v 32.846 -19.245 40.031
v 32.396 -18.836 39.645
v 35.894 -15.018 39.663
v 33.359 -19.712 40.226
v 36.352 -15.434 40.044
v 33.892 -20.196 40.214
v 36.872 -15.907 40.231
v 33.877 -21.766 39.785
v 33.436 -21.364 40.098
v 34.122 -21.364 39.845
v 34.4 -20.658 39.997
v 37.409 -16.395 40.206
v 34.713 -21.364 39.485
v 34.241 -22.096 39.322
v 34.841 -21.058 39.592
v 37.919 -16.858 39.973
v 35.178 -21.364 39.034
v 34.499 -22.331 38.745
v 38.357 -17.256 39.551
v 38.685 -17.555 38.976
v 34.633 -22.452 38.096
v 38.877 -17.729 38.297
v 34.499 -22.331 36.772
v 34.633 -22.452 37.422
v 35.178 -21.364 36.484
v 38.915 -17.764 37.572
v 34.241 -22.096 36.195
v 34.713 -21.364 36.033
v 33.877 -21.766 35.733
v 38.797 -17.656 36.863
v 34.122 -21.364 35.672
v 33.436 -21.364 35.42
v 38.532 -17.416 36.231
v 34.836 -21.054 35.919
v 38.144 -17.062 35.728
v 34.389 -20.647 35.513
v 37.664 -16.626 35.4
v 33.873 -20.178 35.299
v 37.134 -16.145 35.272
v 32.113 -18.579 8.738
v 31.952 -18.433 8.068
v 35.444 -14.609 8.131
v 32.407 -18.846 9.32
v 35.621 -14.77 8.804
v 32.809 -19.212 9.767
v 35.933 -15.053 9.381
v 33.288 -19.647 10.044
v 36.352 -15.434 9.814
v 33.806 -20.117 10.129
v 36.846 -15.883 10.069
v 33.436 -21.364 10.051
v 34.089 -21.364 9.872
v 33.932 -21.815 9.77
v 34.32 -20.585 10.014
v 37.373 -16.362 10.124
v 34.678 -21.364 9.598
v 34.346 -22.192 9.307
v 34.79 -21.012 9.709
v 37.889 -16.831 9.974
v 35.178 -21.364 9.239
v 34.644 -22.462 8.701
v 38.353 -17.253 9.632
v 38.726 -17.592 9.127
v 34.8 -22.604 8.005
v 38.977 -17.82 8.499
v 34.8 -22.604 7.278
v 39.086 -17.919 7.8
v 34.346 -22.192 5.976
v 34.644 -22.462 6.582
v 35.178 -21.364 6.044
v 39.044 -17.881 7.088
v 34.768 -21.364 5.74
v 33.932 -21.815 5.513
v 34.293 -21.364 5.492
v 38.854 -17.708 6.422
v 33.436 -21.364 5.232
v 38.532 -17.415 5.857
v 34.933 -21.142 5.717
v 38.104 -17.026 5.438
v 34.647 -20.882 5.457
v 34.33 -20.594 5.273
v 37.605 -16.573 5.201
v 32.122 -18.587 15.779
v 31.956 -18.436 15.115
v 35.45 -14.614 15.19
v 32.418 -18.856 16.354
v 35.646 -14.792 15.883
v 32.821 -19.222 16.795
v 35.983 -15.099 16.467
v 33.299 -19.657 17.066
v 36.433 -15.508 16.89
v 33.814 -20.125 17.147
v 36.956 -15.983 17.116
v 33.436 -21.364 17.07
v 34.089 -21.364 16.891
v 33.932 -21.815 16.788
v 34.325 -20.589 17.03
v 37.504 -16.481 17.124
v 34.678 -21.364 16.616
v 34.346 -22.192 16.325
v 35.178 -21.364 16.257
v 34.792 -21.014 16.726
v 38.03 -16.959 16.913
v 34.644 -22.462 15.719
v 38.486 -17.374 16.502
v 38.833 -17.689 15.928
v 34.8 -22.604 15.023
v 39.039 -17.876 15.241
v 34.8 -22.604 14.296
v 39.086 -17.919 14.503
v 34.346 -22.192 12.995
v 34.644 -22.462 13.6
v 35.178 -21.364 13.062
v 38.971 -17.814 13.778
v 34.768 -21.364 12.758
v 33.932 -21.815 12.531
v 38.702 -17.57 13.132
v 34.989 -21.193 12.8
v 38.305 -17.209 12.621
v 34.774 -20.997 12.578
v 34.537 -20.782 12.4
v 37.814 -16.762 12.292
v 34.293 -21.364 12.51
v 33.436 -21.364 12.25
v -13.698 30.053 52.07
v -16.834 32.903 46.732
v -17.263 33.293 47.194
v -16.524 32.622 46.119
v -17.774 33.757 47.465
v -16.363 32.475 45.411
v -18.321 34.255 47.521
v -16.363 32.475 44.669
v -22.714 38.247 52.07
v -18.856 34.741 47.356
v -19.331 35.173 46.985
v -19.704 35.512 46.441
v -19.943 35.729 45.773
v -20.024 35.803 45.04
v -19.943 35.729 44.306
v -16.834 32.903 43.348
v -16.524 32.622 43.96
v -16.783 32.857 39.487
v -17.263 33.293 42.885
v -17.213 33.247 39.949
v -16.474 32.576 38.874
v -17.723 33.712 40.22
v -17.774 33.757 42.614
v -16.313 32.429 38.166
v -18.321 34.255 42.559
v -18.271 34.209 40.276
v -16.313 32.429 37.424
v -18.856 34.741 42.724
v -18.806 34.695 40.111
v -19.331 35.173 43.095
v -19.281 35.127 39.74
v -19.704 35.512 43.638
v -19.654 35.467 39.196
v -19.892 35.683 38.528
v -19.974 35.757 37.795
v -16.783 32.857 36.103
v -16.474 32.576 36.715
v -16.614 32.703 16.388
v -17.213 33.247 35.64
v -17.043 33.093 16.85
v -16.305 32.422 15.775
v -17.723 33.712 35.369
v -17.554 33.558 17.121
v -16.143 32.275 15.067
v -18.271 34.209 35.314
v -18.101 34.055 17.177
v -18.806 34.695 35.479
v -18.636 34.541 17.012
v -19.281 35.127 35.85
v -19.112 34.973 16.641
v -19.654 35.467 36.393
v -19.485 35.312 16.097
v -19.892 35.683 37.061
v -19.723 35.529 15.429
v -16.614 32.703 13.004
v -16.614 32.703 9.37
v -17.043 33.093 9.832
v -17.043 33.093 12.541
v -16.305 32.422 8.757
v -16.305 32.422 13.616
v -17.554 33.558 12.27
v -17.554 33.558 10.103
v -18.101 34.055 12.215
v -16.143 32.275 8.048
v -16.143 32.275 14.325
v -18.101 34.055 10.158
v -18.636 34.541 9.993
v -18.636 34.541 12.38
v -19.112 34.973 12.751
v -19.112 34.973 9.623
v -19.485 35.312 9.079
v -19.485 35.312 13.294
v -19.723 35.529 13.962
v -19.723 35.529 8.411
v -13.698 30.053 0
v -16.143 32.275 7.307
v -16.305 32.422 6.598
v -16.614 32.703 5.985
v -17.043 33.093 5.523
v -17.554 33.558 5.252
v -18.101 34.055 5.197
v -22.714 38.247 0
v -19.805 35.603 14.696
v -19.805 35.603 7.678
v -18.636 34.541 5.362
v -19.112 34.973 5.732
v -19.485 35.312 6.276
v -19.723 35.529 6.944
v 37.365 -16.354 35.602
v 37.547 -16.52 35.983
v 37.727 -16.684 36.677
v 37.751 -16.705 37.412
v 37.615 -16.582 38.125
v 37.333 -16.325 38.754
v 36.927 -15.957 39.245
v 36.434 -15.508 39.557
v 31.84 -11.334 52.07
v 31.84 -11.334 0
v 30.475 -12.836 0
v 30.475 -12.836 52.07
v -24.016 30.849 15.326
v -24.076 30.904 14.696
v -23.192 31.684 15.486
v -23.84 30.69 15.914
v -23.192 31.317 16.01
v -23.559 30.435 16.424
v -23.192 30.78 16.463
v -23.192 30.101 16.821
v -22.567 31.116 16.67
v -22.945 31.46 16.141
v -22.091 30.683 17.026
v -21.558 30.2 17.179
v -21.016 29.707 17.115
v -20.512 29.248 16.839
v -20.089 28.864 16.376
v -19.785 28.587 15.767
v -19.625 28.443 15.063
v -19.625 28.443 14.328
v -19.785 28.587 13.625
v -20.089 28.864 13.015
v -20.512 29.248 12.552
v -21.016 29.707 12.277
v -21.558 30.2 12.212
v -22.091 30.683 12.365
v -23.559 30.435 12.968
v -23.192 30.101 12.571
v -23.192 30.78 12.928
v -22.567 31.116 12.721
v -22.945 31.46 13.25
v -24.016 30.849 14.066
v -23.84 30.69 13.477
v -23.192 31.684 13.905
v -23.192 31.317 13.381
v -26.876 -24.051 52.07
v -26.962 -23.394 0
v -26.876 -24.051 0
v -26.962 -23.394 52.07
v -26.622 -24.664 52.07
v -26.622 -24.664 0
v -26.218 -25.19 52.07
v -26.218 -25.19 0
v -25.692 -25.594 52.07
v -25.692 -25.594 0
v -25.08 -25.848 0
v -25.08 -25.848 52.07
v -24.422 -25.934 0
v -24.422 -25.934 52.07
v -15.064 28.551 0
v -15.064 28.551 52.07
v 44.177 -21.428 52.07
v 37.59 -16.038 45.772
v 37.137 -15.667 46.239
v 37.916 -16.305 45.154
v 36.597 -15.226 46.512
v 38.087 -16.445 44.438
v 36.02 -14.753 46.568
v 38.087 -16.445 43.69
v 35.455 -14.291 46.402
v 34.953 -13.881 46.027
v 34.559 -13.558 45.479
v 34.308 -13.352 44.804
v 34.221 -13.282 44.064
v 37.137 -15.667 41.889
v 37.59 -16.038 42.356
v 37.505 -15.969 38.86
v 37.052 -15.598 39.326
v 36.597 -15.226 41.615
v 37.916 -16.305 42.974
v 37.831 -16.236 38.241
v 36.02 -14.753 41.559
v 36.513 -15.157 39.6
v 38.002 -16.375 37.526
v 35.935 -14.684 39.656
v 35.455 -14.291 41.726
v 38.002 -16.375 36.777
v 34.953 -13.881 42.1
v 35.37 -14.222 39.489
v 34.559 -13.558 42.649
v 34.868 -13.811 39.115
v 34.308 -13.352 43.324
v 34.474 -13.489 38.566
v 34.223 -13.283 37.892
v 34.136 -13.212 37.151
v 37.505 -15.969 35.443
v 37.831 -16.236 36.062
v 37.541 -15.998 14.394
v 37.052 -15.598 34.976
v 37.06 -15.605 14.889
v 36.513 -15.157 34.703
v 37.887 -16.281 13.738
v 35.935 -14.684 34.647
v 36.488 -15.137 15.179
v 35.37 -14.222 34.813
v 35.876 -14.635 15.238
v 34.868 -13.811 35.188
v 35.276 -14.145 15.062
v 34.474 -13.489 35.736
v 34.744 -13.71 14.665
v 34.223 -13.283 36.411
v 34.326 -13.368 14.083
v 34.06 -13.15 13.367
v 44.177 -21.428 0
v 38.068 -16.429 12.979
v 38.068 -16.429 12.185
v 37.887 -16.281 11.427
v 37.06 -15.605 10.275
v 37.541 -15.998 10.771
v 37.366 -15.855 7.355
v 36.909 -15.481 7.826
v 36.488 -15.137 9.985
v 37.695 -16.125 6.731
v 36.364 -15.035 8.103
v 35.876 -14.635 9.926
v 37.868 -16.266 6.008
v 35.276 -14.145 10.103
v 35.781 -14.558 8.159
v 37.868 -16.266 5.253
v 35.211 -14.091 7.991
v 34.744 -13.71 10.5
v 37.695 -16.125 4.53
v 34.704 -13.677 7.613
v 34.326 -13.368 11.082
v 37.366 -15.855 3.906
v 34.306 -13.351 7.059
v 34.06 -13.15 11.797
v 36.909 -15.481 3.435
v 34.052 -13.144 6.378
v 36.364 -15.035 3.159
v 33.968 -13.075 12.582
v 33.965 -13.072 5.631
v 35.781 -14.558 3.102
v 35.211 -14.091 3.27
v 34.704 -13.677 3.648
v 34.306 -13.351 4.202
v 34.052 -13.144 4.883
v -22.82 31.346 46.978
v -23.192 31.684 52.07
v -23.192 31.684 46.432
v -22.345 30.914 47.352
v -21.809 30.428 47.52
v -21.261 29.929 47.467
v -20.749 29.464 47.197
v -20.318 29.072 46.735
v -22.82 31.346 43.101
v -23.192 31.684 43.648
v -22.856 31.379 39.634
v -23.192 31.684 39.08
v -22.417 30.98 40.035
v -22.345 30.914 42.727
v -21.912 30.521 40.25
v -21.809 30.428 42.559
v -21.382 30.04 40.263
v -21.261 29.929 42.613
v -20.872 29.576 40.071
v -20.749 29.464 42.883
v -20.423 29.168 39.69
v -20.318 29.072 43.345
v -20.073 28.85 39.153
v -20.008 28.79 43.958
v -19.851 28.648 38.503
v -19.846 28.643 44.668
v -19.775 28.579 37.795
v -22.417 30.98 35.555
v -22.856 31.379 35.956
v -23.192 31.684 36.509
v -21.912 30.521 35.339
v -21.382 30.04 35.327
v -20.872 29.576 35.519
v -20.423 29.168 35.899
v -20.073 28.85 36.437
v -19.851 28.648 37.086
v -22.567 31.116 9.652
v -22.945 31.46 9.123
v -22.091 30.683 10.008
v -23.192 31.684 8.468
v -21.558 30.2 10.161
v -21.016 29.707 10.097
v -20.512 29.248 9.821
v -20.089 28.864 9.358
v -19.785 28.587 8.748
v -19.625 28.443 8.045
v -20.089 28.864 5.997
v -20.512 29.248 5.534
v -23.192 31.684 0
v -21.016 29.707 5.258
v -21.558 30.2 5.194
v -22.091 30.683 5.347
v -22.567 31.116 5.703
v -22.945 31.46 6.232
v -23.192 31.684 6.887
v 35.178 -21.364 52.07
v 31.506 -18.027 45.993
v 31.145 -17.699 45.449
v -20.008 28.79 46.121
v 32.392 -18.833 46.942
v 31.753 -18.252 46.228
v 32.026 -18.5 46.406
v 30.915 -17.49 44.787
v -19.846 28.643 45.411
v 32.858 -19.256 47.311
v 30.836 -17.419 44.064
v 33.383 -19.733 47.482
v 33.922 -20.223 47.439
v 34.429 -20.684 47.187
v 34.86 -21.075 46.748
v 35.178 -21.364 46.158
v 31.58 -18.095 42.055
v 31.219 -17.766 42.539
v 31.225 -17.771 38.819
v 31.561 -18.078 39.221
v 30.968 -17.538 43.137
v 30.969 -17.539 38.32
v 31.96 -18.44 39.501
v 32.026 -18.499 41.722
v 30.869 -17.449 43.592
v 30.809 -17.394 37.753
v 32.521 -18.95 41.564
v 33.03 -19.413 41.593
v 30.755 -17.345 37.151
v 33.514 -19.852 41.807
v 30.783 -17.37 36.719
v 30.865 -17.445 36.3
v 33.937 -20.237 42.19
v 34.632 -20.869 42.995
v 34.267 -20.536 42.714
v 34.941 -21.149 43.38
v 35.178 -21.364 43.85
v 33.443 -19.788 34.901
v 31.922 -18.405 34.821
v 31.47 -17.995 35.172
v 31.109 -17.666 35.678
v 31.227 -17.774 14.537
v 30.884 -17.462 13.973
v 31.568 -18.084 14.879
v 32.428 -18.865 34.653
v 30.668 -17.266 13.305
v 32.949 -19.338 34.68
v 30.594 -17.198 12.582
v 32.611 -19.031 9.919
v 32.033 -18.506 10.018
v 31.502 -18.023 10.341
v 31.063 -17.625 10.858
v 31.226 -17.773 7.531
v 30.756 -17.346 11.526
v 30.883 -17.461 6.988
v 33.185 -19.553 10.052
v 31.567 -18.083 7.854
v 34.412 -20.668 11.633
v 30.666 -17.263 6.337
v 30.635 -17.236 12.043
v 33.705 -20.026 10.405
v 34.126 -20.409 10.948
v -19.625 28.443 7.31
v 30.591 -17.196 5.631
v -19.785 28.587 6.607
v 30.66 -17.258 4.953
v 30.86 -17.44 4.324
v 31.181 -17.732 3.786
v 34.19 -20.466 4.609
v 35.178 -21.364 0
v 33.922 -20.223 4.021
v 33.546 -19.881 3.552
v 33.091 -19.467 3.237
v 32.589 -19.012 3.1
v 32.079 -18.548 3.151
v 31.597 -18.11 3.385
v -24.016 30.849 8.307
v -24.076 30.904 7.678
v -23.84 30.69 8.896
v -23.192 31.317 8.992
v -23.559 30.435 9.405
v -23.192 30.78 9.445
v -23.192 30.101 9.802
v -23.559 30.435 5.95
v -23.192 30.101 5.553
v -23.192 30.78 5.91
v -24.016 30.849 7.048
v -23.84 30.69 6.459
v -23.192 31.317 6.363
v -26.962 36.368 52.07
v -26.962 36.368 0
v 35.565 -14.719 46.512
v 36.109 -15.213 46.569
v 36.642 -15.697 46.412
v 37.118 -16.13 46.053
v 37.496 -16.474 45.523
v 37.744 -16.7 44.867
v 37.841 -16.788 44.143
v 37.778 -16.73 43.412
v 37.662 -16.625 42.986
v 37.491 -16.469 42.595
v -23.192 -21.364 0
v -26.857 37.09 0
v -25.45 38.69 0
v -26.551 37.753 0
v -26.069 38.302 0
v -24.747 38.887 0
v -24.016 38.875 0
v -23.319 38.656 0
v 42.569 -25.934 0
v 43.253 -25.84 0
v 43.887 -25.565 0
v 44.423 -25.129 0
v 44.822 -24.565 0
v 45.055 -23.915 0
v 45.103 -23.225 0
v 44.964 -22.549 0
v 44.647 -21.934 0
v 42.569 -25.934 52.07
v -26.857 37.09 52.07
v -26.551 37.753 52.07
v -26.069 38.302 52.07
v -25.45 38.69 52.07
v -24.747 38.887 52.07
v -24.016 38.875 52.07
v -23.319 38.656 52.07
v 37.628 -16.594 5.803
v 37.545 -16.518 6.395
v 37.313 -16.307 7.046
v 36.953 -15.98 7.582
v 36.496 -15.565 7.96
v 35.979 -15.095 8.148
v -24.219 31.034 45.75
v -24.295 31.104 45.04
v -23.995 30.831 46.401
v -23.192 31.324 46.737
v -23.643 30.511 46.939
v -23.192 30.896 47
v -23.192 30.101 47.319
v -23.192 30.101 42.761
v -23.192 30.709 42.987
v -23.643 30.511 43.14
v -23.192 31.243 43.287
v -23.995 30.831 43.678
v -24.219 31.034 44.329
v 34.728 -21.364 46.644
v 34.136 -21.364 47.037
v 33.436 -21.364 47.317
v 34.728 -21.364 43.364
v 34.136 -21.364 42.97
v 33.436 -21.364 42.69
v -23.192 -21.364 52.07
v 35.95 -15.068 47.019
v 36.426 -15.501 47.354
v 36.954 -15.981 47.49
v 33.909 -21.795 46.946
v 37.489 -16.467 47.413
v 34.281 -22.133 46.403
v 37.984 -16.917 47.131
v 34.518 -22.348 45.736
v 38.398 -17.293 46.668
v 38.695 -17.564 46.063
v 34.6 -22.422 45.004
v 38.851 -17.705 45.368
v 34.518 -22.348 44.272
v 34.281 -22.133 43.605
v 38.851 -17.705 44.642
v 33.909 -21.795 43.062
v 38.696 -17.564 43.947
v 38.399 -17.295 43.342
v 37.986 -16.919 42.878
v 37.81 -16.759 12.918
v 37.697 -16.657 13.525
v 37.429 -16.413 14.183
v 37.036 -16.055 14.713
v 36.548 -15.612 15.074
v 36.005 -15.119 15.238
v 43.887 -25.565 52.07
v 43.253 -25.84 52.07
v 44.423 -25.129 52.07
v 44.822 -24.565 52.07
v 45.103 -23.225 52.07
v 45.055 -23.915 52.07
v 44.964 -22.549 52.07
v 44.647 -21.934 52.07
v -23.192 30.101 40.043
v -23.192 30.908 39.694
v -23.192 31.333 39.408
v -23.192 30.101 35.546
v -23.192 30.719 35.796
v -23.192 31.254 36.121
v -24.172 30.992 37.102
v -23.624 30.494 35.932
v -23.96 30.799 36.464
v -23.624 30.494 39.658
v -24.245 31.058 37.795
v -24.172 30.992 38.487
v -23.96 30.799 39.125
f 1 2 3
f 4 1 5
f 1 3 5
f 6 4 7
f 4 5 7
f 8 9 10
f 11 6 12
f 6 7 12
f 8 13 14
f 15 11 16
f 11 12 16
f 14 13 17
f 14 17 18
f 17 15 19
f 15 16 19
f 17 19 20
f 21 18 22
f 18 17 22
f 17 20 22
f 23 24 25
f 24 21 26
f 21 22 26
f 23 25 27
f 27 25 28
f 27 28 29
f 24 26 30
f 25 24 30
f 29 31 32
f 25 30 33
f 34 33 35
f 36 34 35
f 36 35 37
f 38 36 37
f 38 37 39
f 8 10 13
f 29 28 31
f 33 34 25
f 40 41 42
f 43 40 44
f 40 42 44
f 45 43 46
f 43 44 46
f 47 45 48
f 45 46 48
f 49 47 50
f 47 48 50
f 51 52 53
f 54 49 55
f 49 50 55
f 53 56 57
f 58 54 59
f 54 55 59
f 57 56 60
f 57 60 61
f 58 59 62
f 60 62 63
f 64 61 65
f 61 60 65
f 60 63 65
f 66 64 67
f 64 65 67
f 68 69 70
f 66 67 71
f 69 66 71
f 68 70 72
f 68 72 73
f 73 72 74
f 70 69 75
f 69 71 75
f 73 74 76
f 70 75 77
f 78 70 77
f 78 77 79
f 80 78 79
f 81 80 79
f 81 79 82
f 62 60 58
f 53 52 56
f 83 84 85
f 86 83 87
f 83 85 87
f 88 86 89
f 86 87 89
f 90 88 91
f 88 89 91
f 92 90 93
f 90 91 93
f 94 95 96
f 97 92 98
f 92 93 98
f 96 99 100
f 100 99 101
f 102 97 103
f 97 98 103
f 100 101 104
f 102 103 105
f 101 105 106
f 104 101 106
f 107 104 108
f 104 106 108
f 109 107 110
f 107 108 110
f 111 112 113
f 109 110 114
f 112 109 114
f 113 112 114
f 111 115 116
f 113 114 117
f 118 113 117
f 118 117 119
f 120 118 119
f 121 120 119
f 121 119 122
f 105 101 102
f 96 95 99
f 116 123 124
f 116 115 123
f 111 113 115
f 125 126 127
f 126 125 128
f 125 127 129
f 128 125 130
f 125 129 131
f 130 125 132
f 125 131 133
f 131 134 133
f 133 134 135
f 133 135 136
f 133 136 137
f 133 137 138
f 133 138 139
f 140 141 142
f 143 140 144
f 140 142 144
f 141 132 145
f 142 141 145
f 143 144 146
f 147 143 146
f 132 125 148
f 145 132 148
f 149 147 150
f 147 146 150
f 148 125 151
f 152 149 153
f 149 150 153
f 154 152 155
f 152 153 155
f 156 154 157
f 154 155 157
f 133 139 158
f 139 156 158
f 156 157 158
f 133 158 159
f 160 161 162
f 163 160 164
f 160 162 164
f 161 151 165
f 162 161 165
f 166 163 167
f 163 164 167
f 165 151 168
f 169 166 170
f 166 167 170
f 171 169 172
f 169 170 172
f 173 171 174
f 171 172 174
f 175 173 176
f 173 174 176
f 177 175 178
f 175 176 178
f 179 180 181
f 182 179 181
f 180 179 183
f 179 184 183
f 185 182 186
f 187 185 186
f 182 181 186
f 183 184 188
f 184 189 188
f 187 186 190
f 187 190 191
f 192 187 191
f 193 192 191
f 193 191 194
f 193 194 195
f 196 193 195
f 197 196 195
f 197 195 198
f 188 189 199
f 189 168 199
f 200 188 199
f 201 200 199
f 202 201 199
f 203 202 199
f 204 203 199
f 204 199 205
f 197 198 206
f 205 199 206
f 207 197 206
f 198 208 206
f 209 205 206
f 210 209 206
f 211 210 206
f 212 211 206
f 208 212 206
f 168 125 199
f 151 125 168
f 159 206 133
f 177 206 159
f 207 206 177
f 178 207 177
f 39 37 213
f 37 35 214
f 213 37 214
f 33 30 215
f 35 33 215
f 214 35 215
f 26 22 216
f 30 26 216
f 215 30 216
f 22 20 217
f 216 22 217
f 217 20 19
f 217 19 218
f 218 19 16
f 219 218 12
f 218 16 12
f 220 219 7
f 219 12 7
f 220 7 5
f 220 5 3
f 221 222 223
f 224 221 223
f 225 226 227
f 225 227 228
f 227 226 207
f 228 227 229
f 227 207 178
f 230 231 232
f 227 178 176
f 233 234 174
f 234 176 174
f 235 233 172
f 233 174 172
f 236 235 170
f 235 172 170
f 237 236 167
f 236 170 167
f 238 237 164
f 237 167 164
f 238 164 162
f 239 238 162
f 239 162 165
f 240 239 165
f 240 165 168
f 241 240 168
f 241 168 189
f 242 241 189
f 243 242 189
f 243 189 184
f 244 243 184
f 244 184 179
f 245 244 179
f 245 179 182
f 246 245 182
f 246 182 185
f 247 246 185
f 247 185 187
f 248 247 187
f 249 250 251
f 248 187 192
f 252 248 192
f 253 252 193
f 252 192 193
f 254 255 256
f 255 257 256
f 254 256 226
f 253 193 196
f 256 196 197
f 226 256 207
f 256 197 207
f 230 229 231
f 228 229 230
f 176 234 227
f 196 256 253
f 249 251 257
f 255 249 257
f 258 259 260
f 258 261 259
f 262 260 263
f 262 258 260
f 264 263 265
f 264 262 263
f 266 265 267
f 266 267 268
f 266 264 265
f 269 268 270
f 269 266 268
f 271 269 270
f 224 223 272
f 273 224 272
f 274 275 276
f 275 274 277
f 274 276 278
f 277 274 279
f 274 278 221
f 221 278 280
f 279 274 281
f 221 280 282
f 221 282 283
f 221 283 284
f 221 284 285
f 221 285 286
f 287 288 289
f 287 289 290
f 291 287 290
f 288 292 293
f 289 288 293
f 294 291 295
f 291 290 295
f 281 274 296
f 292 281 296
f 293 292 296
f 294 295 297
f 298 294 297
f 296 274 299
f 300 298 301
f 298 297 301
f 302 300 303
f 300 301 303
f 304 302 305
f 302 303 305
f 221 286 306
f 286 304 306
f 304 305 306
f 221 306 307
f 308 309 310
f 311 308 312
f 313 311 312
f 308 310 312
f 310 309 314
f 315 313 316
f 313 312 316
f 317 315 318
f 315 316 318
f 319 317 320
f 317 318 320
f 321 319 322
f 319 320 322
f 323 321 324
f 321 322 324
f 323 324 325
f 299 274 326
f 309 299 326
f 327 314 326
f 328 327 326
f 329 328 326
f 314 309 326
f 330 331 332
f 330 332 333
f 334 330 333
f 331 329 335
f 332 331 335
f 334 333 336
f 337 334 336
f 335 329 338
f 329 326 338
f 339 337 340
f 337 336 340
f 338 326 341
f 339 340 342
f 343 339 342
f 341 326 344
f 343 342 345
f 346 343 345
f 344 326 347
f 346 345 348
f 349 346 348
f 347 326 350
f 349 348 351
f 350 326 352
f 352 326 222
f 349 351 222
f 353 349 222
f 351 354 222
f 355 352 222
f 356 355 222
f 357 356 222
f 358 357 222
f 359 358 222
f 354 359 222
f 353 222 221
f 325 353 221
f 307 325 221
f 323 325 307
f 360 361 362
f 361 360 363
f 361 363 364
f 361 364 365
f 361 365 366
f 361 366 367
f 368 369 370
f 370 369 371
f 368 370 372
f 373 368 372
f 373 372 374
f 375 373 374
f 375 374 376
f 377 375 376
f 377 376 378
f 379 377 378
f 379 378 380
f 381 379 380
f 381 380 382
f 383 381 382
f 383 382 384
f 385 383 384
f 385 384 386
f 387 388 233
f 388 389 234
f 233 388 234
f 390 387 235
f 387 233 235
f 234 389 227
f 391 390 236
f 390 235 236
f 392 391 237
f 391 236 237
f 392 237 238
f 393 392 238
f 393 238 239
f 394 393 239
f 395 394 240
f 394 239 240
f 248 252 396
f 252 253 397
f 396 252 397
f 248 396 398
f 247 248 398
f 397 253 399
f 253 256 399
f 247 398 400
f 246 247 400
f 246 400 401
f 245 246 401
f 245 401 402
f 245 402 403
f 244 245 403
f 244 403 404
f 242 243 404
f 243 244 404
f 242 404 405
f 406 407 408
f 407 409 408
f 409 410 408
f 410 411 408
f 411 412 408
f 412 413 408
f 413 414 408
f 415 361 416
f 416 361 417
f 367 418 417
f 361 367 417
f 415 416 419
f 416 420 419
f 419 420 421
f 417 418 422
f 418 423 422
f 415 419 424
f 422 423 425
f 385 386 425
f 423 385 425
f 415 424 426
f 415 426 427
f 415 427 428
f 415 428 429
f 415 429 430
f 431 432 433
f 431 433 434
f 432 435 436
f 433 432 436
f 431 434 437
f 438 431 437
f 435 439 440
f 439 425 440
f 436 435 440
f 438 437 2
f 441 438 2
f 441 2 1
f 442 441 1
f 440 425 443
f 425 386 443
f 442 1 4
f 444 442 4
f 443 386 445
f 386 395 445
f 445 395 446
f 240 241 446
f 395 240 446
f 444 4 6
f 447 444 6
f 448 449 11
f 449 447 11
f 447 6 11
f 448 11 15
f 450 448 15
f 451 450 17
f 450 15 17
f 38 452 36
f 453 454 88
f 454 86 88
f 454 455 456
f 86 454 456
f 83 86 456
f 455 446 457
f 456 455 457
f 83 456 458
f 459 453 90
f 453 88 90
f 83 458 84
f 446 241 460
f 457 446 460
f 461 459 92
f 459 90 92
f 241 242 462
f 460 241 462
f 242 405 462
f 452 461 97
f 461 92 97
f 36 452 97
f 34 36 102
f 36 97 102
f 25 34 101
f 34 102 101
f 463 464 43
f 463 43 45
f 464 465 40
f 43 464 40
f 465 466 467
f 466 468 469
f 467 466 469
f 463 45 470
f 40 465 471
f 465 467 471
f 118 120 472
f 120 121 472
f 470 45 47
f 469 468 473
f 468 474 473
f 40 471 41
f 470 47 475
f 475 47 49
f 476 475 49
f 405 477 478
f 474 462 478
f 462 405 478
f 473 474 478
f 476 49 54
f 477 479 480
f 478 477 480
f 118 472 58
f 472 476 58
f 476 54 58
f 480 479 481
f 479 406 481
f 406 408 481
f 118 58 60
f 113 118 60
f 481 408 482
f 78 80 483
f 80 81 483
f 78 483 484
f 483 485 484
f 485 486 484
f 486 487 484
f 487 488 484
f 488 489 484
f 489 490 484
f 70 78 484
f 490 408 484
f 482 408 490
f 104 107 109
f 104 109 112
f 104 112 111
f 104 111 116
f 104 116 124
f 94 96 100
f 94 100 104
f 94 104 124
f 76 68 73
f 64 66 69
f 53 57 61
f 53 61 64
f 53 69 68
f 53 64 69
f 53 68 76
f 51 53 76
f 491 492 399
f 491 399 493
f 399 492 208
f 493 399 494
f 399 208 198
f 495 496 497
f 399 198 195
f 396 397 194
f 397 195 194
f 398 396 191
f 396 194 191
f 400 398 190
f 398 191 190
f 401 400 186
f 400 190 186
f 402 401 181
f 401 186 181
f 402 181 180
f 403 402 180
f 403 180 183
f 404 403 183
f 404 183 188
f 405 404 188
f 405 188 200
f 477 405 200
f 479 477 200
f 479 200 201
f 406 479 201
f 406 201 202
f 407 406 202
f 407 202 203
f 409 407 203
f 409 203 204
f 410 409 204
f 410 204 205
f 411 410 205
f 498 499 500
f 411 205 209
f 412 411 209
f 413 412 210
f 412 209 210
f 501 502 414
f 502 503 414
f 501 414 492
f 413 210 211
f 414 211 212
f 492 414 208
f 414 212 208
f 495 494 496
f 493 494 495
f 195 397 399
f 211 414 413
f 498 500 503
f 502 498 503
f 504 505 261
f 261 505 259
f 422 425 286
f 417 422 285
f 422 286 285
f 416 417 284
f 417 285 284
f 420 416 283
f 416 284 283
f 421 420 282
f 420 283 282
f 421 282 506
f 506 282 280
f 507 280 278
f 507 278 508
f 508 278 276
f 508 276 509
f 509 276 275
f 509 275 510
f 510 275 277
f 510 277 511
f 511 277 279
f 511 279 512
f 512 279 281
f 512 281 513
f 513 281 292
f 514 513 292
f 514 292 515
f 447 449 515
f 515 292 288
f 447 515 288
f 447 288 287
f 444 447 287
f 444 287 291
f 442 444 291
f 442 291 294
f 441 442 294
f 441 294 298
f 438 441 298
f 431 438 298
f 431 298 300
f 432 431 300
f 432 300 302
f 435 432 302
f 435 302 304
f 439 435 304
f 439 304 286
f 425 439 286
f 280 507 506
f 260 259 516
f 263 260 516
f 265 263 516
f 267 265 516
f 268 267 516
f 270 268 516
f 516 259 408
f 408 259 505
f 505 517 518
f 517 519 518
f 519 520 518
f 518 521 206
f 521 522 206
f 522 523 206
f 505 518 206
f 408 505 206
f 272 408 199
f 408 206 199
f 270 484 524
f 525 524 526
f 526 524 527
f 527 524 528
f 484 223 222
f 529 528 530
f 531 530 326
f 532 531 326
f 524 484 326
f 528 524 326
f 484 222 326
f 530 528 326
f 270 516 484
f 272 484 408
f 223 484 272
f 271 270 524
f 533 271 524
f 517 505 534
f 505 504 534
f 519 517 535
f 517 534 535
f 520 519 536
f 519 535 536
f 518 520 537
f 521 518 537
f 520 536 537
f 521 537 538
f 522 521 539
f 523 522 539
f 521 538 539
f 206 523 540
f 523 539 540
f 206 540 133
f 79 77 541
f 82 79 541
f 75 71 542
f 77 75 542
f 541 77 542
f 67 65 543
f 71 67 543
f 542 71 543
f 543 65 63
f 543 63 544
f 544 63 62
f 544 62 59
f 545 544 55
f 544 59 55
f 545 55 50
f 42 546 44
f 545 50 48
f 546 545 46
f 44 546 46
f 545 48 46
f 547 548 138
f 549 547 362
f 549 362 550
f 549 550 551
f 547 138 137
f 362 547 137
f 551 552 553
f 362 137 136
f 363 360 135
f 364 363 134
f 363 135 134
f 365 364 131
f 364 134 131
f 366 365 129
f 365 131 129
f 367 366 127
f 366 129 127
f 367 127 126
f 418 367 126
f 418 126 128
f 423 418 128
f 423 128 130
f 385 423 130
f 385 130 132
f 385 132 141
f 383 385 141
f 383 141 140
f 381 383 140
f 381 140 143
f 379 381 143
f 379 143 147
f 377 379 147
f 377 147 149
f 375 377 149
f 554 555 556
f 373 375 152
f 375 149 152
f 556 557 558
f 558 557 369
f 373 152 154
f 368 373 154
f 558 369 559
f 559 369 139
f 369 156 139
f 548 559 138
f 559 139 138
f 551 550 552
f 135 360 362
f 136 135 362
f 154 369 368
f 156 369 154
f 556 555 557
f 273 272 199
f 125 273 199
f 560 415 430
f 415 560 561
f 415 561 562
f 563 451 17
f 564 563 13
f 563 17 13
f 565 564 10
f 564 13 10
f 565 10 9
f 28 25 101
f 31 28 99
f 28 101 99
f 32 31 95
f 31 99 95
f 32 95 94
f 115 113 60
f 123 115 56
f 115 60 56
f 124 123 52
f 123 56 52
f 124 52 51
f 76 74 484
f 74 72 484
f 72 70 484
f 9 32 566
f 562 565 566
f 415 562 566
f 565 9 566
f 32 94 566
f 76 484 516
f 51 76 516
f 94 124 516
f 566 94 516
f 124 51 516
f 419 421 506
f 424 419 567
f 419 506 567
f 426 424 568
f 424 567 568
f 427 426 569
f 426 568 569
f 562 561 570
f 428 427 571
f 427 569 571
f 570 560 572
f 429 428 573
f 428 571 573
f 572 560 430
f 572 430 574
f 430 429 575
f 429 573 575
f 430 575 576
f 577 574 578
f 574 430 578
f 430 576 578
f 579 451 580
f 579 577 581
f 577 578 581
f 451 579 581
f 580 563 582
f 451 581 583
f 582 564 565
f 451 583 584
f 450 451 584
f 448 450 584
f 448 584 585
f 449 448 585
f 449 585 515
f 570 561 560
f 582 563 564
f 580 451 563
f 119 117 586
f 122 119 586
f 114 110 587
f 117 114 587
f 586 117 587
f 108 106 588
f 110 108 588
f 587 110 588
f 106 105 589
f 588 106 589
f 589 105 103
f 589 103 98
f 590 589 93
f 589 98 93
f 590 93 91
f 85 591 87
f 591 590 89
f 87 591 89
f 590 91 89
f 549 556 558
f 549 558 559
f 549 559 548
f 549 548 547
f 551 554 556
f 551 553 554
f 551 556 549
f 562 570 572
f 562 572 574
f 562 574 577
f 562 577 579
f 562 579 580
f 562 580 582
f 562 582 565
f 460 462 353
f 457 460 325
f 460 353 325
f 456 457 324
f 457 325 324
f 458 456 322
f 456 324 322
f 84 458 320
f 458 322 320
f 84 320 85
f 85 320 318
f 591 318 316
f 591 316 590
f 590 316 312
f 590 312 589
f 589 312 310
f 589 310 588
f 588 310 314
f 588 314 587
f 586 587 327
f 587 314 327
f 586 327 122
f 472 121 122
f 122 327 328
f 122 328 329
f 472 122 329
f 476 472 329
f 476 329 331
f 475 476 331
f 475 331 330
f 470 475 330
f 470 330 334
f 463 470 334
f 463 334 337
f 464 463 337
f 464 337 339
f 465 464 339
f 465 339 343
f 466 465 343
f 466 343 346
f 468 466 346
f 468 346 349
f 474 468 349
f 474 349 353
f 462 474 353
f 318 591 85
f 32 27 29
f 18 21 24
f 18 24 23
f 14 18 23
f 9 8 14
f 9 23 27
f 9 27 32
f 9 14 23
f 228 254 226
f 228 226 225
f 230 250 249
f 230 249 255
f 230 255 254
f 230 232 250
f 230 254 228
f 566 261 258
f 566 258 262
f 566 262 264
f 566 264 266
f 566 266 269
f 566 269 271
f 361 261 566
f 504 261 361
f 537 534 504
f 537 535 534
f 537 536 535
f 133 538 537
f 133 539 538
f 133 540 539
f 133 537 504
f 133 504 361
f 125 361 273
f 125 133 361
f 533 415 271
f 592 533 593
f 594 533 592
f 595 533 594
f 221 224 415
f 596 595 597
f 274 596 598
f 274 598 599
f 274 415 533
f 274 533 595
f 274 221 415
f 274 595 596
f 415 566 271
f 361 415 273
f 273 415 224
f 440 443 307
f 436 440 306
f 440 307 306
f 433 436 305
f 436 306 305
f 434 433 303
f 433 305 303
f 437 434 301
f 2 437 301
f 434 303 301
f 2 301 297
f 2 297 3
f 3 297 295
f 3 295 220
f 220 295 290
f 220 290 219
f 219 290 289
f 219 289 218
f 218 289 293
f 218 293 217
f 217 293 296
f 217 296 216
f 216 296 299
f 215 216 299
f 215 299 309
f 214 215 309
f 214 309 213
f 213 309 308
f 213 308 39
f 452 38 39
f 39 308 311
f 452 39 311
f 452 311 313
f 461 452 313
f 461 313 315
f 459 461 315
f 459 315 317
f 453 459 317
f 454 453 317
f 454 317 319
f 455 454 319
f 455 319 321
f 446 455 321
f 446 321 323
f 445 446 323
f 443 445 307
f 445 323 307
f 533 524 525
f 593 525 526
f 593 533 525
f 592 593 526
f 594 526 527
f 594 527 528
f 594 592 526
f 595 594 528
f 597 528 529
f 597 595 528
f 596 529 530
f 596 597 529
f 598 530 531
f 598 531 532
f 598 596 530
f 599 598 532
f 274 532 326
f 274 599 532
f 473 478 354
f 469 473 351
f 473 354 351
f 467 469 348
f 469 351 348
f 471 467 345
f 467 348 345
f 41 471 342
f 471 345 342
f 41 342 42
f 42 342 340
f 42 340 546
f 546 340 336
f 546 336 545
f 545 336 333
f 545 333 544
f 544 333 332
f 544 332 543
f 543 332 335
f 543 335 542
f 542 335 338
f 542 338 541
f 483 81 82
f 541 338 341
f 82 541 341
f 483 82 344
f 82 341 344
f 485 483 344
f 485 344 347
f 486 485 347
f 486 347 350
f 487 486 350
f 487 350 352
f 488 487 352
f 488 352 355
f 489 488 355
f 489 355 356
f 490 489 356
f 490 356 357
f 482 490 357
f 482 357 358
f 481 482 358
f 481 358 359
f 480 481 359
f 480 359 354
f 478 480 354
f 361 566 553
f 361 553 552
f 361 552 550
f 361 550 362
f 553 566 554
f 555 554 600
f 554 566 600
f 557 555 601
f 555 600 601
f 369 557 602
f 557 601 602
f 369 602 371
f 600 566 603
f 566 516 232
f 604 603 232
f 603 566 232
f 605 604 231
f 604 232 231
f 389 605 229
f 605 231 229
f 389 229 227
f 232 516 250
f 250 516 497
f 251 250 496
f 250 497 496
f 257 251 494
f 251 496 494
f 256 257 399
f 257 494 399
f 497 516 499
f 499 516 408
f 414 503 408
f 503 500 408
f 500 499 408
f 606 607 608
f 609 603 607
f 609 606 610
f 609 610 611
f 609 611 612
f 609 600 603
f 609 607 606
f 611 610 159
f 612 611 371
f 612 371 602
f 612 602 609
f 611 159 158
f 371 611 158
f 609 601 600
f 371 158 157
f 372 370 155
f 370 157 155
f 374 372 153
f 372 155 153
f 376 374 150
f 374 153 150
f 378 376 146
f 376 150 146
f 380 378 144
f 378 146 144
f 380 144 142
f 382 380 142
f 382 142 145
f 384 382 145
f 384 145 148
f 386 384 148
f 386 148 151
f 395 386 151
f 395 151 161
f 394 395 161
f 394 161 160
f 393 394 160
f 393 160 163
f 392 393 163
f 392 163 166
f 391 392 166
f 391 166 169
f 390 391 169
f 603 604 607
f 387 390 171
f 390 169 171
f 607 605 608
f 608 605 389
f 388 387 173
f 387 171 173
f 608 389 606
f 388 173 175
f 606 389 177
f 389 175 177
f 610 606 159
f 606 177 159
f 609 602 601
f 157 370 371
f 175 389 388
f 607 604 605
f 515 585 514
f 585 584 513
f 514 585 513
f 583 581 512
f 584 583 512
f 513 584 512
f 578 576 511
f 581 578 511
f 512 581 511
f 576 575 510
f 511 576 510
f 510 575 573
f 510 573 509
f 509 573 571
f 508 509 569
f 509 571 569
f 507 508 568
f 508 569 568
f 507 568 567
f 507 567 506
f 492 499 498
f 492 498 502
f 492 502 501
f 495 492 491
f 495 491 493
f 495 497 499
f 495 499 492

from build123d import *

# Parameters (mm, degrees)
BOSS_EXTRUDE2_DEPTH = 52.07
FILLET1_R           = 2.54
FILLET2_R           = 2.54
SKETCH2_R           = 2.487911977
CUT_EXTRUDE1_DEPTH  = 6.35
SKETCH3_R           = 2.511508717
CUT_EXTRUDE2_DEPTH  = 6.35
SKETCH4_R           = 2.535513074
SKETCH4_R_2         = 2.663596319
CUT_EXTRUDE3_DEPTH  = 6.35


with BuildPart() as part:
    # Sketch1 → Boss-Extrude2 (new body)
    with BuildSketch(Plane.XY):
        Polygon((-26.962285336, 42.108267604), (-26.962285336, -25.93406259), (49.683796158, -25.93406259), (31.840285665, -11.333620206), (30.474759276, -12.836120693), (-15.063657258, 28.550827293), (-13.698130869, 30.053327779), align=None)
        Polygon((-23.192135268, -21.36418372), (-23.192135268, 31.68438668), (35.177665187, -21.36418372), align=None, mode=Mode.SUBTRACT)
    extrude(amount=BOSS_EXTRUDE2_DEPTH)

    # Fillet1
    fillet1_edges = [part.edges().sort_by_distance(p)[0] for p in [
        (49.683796158, -25.93406259, 26.035),
        (-26.962285336, 42.108267604, 26.035),
    ]]
    fillet(fillet1_edges, radius=FILLET1_R)

    # Fillet2
    fillet2_edges = [part.edges().sort_by_distance(p)[0] for p in [
        (-26.962285336, -25.93406259, 26.035),
    ]]
    fillet(fillet2_edges, radius=FILLET2_R)

    # Sketch2 → Cut-Extrude1 (cut)
    with BuildSketch(Plane(origin=(8.761925392, 9.640822229, 0), x_dir=(0.7400339952176945, -0.6725694654993916, 0), z_dir=(0.6725694654993916, 0.7400339952176945, 0))):
        with Locations(Location((-36.410725244, -45.039764093, 0), (0, 0, 180))):
            Circle(SKETCH2_R)
        with Locations(Location((-36.342932428, -37.794805414, 0), (0, 0, 180))):
            Circle(SKETCH2_R)
        with Locations(Location((-36.113890977, -14.695763967, 0), (0, 0, 180))):
            Circle(SKETCH2_R)
        with Locations(Location((-36.113890977, -7.677508428, 0), (0, 0, 180))):
            Circle(SKETCH2_R)
        with Locations(Location((38.19748483, -45.003751016, 0), (0, 0, 180))):
            Circle(SKETCH2_R)
        with Locations(Location((38.265277646, -37.758792337, 0), (0, 0, 180))):
            Circle(SKETCH2_R)
        with Locations(Location((38.494319097, -14.659750891, 0), (0, 0, 180))):
            Circle(SKETCH2_R)
        with Locations(Location((38.494319097, -7.641495351, 0), (0, 0, 180))):
            Circle(SKETCH2_R)
    extrude(amount=-CUT_EXTRUDE1_DEPTH, mode=Mode.SUBTRACT)

    # Sketch3 → Cut-Extrude2 (cut)
    with BuildSketch(Plane(origin=(7.214216448, 8.816647023, 0), x_dir=(0.773931651192209, -0.6332691365311442, 0), z_dir=(0.6332691365311442, 0.773931651192209, 0))):
        with Locations(Location((37.297632804, -37.151246131, 0), (0, 0, 180))):
            Circle(SKETCH3_R)
        with Locations(Location((37.407323838, -44.063868687, 0), (0, 0, 180))):
            Circle(SKETCH3_R)
    extrude(amount=-CUT_EXTRUDE2_DEPTH, mode=Mode.SUBTRACT)

    # Sketch4 → Cut-Extrude3 (cut)
    with BuildSketch(Plane(origin=(7.214216448, 8.816647023, 0), x_dir=(0.773931651192209, -0.6332691365311442, 0), z_dir=(0.6332691365311442, 0.773931651192209, 0))):
        with Locations(Location((37.100504768, -5.630572581, 0), (0, 0, 180))):
            Circle(SKETCH4_R)
        with Locations(Location((37.232498306, -12.582232269, 0), (0, 0, 180))):
            Circle(SKETCH4_R_2)
    extrude(amount=-CUT_EXTRUDE3_DEPTH, mode=Mode.SUBTRACT)


solid = part.part
